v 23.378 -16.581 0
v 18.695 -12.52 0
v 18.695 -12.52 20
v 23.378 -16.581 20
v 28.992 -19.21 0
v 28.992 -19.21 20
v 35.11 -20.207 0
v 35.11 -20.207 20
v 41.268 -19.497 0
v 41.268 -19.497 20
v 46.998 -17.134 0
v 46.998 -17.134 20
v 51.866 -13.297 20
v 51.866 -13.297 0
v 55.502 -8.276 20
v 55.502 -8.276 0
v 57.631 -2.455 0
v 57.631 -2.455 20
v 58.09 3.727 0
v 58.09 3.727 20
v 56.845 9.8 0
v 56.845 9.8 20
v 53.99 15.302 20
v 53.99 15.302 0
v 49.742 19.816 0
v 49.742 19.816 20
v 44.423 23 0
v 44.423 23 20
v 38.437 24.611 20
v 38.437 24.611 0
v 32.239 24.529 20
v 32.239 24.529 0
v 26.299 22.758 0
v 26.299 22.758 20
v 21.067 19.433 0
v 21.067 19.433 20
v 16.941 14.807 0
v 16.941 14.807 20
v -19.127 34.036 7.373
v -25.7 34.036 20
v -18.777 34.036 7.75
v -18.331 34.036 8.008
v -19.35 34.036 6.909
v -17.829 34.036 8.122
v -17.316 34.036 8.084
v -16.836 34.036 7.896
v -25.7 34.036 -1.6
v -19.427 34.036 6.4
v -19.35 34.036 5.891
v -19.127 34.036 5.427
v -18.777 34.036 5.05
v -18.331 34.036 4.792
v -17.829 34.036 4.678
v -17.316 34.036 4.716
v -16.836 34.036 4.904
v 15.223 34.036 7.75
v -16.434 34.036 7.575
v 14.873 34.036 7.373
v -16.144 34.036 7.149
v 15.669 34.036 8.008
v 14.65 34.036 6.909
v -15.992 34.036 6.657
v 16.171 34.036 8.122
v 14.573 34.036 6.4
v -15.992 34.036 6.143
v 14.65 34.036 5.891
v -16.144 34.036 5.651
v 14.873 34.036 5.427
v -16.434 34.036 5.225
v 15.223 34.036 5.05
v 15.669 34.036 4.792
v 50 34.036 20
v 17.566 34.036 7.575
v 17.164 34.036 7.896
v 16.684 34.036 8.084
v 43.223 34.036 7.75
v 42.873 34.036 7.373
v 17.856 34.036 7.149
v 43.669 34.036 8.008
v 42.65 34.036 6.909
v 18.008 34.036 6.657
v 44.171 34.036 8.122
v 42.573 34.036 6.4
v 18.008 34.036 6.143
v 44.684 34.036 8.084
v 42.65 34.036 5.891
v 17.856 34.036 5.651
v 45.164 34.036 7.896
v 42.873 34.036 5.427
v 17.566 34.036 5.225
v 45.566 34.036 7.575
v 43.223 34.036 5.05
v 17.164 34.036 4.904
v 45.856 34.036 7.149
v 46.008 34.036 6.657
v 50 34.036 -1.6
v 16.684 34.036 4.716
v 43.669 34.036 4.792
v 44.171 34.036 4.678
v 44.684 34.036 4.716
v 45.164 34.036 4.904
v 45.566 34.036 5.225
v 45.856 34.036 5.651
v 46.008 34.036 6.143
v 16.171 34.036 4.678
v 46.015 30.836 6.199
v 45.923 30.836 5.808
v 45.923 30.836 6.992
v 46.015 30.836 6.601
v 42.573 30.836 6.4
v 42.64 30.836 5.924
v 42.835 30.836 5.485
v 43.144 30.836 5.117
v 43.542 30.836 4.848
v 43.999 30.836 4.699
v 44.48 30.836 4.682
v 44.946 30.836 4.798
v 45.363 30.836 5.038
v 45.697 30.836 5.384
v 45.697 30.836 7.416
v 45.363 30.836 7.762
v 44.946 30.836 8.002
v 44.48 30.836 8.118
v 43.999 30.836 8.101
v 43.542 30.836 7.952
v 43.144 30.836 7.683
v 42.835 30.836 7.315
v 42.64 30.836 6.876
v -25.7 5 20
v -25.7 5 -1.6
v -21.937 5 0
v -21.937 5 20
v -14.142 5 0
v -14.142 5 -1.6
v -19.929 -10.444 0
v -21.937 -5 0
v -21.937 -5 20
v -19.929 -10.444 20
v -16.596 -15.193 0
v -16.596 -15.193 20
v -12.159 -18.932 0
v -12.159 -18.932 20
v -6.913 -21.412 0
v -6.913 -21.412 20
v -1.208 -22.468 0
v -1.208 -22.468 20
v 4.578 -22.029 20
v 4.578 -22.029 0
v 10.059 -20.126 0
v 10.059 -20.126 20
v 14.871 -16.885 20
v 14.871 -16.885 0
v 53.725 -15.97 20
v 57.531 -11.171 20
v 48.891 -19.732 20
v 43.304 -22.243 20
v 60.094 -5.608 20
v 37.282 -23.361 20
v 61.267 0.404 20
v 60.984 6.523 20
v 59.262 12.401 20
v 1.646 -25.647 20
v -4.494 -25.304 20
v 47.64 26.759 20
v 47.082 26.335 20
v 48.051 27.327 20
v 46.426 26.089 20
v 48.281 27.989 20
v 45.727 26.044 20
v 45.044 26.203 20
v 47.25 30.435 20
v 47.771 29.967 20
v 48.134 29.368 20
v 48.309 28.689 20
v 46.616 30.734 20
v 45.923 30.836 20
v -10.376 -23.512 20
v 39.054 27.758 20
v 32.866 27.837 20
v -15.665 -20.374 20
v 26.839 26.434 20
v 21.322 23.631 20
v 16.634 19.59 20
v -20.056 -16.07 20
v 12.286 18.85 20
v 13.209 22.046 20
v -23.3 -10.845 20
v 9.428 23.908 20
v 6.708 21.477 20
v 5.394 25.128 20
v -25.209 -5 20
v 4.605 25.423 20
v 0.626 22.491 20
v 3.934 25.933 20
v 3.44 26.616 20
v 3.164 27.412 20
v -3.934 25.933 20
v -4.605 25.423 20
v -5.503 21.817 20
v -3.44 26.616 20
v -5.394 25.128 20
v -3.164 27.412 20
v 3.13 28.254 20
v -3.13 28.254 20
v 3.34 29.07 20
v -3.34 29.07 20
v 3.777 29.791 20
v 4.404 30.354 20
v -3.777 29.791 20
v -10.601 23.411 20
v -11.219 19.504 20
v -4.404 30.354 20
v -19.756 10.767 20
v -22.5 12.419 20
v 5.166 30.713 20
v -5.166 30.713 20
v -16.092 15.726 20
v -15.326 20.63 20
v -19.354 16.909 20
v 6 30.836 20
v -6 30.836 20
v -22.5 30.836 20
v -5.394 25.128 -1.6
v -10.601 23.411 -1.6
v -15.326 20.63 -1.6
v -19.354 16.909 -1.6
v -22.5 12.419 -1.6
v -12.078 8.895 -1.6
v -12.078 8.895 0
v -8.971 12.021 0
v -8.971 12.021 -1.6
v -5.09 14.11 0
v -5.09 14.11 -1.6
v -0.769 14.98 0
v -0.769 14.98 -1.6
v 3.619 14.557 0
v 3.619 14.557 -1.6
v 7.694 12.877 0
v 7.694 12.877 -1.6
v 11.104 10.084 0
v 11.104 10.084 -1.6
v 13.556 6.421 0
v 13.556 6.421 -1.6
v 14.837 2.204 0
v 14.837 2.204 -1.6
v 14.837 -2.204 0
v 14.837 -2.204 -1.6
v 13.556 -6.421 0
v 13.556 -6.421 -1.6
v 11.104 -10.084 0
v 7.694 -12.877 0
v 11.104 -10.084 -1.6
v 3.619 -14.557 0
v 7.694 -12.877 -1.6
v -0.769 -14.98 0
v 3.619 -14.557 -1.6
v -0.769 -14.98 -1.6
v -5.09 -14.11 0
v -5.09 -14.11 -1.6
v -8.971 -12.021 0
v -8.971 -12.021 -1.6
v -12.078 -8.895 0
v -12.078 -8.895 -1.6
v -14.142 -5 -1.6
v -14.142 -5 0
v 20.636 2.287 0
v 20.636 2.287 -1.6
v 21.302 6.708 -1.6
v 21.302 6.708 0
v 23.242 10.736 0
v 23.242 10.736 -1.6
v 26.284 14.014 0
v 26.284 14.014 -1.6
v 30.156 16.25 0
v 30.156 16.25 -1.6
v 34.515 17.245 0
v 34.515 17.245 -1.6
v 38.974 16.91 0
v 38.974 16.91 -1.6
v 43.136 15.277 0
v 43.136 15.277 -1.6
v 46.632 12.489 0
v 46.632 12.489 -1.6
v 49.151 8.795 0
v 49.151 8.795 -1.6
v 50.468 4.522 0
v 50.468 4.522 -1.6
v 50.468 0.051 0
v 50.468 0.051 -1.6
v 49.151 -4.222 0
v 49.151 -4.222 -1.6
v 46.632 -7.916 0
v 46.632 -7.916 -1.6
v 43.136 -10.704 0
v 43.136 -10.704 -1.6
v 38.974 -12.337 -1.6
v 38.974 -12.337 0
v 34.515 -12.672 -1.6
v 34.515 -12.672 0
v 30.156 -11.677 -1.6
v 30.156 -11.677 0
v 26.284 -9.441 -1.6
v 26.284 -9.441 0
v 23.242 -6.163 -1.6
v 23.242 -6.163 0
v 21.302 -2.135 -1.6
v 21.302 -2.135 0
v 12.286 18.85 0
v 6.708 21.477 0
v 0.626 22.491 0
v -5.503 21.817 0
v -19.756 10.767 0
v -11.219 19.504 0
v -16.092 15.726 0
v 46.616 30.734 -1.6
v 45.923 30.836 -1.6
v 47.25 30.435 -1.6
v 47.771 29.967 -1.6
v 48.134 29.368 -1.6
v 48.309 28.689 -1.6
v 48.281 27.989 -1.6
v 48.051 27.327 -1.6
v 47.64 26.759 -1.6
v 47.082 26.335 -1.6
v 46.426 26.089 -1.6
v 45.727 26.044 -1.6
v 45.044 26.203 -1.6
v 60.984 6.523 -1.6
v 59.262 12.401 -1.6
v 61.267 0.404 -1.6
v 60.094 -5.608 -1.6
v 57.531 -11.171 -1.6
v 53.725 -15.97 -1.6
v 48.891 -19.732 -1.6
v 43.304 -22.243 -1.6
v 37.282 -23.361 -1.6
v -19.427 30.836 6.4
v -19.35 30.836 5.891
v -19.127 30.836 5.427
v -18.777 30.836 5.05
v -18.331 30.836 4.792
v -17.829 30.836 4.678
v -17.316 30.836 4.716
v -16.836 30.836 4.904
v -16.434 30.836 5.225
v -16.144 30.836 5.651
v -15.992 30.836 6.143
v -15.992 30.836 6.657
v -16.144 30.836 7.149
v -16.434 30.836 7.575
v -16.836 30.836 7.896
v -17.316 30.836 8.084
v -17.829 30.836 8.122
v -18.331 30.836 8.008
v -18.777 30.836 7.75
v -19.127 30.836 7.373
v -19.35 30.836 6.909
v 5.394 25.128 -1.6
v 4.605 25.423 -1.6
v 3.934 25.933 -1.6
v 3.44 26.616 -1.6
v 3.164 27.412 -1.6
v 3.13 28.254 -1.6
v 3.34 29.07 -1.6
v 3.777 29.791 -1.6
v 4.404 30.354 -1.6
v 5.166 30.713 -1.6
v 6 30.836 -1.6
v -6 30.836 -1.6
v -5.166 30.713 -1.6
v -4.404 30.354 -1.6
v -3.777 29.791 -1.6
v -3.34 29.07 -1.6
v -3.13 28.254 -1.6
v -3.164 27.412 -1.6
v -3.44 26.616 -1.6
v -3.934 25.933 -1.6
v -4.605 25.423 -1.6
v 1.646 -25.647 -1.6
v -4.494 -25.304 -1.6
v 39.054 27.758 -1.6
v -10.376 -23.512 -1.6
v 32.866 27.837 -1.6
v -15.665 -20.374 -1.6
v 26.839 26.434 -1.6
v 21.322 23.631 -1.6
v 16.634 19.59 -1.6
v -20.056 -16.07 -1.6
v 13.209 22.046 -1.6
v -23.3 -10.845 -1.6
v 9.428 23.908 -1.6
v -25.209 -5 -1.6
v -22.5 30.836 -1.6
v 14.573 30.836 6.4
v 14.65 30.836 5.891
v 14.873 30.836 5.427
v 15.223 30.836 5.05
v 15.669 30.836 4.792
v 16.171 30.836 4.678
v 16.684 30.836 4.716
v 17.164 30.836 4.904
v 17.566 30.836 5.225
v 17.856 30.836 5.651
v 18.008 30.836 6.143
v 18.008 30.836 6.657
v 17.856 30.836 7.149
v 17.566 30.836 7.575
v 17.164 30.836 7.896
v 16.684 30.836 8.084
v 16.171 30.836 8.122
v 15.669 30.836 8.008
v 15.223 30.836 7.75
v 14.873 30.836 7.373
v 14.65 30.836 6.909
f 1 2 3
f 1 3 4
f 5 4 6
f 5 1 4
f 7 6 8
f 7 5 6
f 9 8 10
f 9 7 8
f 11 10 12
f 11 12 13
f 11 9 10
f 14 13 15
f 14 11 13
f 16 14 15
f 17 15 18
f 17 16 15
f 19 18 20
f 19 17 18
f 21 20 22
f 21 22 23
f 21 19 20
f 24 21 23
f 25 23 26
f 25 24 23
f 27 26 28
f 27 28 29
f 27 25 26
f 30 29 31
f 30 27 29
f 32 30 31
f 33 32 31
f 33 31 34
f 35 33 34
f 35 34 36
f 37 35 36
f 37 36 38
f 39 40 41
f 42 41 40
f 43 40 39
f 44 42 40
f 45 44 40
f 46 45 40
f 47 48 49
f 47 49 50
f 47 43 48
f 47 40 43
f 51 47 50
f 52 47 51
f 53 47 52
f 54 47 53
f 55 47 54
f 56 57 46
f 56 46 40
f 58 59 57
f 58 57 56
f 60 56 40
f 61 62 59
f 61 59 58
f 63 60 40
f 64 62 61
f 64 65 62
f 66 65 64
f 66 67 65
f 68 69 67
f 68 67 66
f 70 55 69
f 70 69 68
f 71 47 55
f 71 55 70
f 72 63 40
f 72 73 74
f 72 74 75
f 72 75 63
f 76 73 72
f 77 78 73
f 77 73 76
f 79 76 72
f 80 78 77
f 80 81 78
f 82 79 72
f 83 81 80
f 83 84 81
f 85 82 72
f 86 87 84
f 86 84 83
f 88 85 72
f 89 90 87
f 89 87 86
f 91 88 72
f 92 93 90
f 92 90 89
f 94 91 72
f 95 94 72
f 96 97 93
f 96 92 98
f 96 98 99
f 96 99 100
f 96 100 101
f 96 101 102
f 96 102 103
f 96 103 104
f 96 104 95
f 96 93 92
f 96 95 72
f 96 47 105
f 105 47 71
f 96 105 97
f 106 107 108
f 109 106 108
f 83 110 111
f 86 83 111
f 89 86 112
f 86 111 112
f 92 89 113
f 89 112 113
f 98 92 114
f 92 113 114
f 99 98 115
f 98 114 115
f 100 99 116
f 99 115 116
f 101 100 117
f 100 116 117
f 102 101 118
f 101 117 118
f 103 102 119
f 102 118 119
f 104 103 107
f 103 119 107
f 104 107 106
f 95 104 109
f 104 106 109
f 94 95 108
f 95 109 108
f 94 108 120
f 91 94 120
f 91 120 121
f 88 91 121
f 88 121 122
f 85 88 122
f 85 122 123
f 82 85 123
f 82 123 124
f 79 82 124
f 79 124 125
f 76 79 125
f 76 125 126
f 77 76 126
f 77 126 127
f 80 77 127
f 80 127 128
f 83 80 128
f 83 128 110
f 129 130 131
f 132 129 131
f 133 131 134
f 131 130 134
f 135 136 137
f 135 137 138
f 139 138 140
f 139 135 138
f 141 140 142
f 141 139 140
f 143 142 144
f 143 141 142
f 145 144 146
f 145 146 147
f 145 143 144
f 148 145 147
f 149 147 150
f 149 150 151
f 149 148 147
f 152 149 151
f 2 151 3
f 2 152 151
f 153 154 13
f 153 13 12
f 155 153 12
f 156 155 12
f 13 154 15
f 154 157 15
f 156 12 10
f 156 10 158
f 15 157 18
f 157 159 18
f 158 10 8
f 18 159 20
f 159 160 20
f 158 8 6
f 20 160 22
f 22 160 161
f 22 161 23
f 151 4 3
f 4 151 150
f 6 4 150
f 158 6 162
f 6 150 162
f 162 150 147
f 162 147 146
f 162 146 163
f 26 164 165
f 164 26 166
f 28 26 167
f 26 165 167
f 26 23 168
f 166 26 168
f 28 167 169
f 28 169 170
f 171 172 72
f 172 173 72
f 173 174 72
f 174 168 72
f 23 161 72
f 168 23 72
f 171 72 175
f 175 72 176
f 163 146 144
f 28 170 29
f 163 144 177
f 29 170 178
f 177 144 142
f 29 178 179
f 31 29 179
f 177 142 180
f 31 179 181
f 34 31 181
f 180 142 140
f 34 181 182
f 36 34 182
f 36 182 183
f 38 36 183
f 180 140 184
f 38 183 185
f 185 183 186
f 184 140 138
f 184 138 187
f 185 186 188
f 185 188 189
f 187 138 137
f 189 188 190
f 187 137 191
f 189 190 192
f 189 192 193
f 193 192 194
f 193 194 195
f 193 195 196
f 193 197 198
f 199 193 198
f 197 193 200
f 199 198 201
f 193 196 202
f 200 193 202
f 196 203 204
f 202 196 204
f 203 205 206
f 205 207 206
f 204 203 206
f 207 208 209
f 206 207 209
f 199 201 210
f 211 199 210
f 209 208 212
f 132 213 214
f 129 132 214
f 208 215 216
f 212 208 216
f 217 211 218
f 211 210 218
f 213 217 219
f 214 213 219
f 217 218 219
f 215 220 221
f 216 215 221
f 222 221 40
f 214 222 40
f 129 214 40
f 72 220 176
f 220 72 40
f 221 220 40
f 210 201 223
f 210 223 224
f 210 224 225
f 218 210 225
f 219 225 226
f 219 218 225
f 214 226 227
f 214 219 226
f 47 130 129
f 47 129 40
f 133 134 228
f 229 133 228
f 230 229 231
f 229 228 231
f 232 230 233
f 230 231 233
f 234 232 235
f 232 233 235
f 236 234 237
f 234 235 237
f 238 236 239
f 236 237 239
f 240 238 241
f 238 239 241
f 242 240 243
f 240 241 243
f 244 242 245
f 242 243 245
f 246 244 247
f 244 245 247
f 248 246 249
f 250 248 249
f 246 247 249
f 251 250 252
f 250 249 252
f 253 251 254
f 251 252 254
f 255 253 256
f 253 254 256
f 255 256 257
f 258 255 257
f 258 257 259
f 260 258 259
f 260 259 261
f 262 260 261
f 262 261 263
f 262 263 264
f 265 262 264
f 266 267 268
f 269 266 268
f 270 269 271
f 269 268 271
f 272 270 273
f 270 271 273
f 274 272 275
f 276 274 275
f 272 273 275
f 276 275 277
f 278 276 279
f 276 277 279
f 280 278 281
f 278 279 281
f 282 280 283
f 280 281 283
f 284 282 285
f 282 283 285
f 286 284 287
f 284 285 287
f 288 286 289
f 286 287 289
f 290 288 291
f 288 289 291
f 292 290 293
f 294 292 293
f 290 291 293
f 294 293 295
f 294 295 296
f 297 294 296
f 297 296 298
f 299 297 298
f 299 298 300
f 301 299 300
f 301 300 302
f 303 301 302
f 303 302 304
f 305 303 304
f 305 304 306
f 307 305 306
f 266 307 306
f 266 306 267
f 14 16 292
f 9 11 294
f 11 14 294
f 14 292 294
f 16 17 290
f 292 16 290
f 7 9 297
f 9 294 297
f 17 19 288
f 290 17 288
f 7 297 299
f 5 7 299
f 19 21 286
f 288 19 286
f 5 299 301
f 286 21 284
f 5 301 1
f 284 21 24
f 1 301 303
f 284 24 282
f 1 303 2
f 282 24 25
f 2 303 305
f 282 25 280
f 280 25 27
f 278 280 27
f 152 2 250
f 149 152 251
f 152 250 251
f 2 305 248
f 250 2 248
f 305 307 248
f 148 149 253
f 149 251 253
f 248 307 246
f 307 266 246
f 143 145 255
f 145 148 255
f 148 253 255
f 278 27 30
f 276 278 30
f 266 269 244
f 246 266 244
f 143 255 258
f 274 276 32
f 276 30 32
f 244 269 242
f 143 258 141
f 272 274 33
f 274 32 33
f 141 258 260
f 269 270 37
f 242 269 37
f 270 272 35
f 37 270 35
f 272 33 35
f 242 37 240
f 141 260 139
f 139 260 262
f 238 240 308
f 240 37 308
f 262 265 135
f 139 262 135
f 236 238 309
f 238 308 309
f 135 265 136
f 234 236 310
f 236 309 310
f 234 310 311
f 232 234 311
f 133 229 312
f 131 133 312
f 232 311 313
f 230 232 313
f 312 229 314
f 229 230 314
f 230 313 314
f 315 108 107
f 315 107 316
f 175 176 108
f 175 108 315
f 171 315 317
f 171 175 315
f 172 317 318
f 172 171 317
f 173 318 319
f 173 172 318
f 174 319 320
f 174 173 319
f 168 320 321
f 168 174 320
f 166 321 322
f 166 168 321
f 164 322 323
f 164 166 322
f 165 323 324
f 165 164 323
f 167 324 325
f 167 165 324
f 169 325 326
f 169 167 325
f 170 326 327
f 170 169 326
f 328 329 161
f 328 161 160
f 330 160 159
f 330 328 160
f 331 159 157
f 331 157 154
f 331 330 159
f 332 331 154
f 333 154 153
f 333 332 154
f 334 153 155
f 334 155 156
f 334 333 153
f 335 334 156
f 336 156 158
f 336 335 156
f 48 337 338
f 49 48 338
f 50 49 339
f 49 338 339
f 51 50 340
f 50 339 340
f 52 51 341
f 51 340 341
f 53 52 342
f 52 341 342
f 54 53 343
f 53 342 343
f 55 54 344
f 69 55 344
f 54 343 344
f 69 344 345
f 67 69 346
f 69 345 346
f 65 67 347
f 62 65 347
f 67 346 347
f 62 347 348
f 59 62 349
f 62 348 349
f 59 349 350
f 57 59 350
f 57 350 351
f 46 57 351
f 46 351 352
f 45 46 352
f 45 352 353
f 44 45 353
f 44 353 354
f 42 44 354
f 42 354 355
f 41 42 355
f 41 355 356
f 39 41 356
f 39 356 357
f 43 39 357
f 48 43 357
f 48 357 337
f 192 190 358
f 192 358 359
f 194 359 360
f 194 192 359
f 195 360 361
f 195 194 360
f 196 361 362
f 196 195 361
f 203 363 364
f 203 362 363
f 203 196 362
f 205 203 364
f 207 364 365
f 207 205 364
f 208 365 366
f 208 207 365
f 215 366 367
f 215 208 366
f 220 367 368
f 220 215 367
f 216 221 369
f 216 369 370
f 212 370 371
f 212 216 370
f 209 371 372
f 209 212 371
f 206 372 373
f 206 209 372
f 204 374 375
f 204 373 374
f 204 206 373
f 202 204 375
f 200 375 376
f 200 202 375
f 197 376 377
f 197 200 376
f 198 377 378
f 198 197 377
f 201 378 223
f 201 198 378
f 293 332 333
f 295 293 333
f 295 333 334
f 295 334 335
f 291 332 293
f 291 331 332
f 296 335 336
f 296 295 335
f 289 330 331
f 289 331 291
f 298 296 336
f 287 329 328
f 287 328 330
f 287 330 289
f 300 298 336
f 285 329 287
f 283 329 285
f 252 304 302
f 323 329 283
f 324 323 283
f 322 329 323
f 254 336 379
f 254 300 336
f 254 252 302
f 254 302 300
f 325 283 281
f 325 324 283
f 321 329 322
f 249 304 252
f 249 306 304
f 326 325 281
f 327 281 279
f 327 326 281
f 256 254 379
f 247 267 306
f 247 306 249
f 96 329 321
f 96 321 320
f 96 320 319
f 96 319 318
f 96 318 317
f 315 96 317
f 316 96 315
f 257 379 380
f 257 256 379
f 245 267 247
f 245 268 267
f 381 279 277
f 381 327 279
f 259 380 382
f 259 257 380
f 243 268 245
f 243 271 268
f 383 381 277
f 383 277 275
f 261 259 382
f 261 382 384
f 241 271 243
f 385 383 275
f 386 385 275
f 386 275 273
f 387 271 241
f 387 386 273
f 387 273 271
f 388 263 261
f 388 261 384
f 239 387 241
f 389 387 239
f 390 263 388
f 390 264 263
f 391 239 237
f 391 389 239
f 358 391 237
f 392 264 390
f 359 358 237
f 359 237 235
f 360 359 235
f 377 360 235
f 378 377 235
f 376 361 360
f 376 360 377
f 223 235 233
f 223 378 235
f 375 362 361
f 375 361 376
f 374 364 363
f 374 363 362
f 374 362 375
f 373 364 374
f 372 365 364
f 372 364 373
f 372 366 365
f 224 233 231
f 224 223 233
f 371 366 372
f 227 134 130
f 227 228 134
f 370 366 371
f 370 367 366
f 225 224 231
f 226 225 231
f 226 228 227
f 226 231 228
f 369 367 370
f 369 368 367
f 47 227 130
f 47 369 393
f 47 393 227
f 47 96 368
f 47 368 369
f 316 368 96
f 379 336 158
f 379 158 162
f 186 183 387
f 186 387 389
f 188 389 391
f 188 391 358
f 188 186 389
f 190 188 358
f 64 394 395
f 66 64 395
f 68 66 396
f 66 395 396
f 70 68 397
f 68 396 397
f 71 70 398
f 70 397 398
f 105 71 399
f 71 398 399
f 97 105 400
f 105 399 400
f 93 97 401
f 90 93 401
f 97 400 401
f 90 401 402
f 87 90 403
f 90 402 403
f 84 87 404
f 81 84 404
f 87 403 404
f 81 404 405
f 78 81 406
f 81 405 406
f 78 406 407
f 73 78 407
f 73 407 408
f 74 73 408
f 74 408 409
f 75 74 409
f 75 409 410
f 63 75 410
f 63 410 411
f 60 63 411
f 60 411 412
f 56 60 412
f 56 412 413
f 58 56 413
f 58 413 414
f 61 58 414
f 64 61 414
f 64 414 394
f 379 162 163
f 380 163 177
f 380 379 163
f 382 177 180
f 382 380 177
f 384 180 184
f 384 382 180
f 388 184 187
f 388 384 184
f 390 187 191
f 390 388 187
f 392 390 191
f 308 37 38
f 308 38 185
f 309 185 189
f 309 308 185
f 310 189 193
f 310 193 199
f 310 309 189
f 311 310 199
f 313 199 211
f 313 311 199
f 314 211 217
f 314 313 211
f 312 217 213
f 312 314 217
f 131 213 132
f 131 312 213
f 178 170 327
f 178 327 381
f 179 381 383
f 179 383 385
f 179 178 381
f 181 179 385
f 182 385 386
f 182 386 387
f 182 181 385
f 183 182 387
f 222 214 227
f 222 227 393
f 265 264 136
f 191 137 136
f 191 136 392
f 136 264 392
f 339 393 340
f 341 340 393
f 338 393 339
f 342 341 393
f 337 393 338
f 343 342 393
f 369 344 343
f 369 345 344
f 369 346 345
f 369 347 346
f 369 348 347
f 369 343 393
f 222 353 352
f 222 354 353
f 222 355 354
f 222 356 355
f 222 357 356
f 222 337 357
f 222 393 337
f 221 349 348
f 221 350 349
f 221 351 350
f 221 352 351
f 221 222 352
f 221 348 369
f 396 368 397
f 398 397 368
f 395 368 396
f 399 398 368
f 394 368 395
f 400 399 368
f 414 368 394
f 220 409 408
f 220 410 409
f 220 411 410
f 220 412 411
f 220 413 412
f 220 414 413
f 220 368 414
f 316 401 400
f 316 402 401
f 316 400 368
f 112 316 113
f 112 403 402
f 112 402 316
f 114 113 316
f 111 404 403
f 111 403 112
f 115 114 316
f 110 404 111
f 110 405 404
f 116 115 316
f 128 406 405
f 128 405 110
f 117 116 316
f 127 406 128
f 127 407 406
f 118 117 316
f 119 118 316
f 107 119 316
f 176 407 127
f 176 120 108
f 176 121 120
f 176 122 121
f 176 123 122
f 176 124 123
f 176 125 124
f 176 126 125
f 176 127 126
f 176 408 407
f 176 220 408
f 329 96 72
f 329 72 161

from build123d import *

# Parameters (mm, degrees)
BOSS_EXTRUDE1_DEPTH       = 20
BOSS_EXTRUDE2_START       = 1.6
BOSS_EXTRUDE2_DEPTH       = 1.6
CUT_EXTRUDE1_REACH        = 75.397
CUT_EXTRUDE3_REACH        = 75.397
CUT_EXTRUDE4_REACH        = 75.397
SKETCH6_R                 = 15
F_8_32_TAPPED_HOLE1_D     = 3.4544
F_8_32_TAPPED_HOLE1_DEPTH = 3.2


with BuildPart() as part:
    # Sketch1 → Boss-Extrude1 (new body)
    with BuildSketch(Plane.XY):
        with BuildLine():
            Line((37.281598718, -23.36075752), (1.645598718, -25.647261157))
            ThreePointArc((1.645598718, -25.647261157), (-17.581213168, -18.745424602), (-25.7, 0))
            Line((-25.7, 0), (-25.7, 34.036))
            Line((-25.7, 34.036), (50, 34.036))
            Line((50, 34.036), (59.262043429, 12.400853436))
            ThreePointArc((59.262043429, 12.400853436), (57.530912166, -11.170941189), (37.281598718, -23.36075752))
        make_face()
        with BuildLine():
            ThreePointArc((16.941307547, 14.806826081), (-22.453827861, -1.440699267), (18.694692453, -12.520322444))
            ThreePointArc((18.694692453, -12.520322444), (58.089827861, 3.727202903), (16.941307547, 14.806826081))
        make_face(mode=Mode.SUBTRACT)
    extrude(amount=BOSS_EXTRUDE1_DEPTH)

    # Sketch2 → Boss-Extrude2 (add)
    with BuildSketch(Plane(origin=(0, 0, 0), x_dir=(-1, 0, 0), z_dir=(0, 0, -1)).offset(BOSS_EXTRUDE2_START)):
        with BuildLine():
            Line((25.7, 0), (25.7, 34.036))
            Line((25.7, 34.036), (-50, 34.036))
            Line((-50, 34.036), (-59.262043429, 12.400853436))
            ThreePointArc((-59.262043429, 12.400853436), (-57.530912166, -11.170941189), (-37.281598718, -23.36075752))
            Line((-37.281598718, -23.36075752), (-1.645598718, -25.647261157))
            ThreePointArc((-1.645598718, -25.647261157), (17.581213168, -18.745424602), (25.7, 0))
        make_face()
    extrude(amount=-BOSS_EXTRUDE2_DEPTH)

    # Sketch3 → Cut-Extrude1 (cut, up to next)
    with BuildSketch(Plane.XY.offset(20), mode=Mode.PRIVATE) as cut_extrude1_sk1:
        with BuildLine():
            ThreePointArc((-5.394176999, 25.127531803), (-15.326311164, 20.629934225), (-22.5, 12.419339757))
            Line((-22.5, 12.419339757), (-22.5, 30.836))
            Line((-22.5, 30.836), (-6, 30.836))
            ThreePointArc((-6, 30.836), (-3.129737352, 28.254231355), (-5.394176999, 25.127531803))
        make_face()
    cut_extrude1_tool1 = extrude(cut_extrude1_sk1.sketch, amount=-CUT_EXTRUDE1_REACH, mode=Mode.PRIVATE) & part.part
    # Sketch3 → Cut-Extrude1 (cut, up to next)
    with BuildSketch(Plane.XY.offset(20), mode=Mode.PRIVATE) as cut_extrude1_sk2:
        with BuildLine():
            ThreePointArc((16.634374037, 19.590497707), (11.35689006, 23.054523378), (5.394176999, 25.127531803))
            ThreePointArc((5.394176999, 25.127531803), (3.129737352, 28.254231355), (6, 30.836))
            Line((6, 30.836), (45.922585437, 30.836))
            ThreePointArc((45.922585437, 30.836), (48.2805699, 27.988887856), (45.044015862, 26.202591058))
            ThreePointArc((45.044015862, 26.202591058), (29.810256845, 27.317498757), (16.634374037, 19.590497707))
        make_face()
    cut_extrude1_tool2 = extrude(cut_extrude1_sk2.sketch, amount=-CUT_EXTRUDE1_REACH, mode=Mode.PRIVATE) & part.part
    add(cut_extrude1_tool1.solids().sort_by_distance((-15.04252, 25.299031, 20))[0], mode=Mode.SUBTRACT)
    add(cut_extrude1_tool2.solids().sort_by_distance((22.114051, 27.528579, 20))[0], mode=Mode.SUBTRACT)

    # Sketch5 → Cut-Extrude3 (cut, up to next)
    with BuildSketch(Plane(origin=(0, 0, -1.6), x_dir=(-1, 0, 0), z_dir=(0, 0, -1)), mode=Mode.PRIVATE) as cut_extrude3_sk1:
        with BuildLine():
            Line((25.7, 5), (0, 5))
            ThreePointArc((0, 5), (-5, 0), (0, -5))
            Line((0, -5), (25.20892699, -5))
            ThreePointArc((25.20892699, -5), (25.576937108, -2.512028697), (25.7, 0))
            Line((25.7, 0), (25.7, 5))
        make_face()
    cut_extrude3_tool1 = extrude(cut_extrude3_sk1.sketch, amount=-CUT_EXTRUDE3_REACH, mode=Mode.PRIVATE) & part.part
    add(cut_extrude3_tool1.solids().sort_by_distance((-10.824957, 0.010355, -1.6))[0], mode=Mode.SUBTRACT)

    # Sketch6 → Cut-Extrude4 (cut, up to next)
    with BuildSketch(Plane(origin=(0, 0, -1.6), x_dir=(-1, 0, 0), z_dir=(0, 0, -1)), mode=Mode.PRIVATE) as cut_extrude4_sk1:
        with Locations((-35.636, 2.286503637)):
            Circle(SKETCH6_R)
    cut_extrude4_tool1 = extrude(cut_extrude4_sk1.sketch, amount=-CUT_EXTRUDE4_REACH, mode=Mode.PRIVATE) & part.part
    # Sketch6 → Cut-Extrude4 (cut, up to next)
    with BuildSketch(Plane(origin=(0, 0, -1.6), x_dir=(-1, 0, 0), z_dir=(0, 0, -1)), mode=Mode.PRIVATE) as cut_extrude4_sk2:
        Circle(SKETCH6_R)
    cut_extrude4_tool2 = extrude(cut_extrude4_sk2.sketch, amount=-CUT_EXTRUDE4_REACH, mode=Mode.PRIVATE) & part.part
    add(cut_extrude4_tool1.solids().sort_by_distance((35.636, 2.286504, -1.6))[0], mode=Mode.SUBTRACT)
    add(cut_extrude4_tool2.solids().sort_by_distance((0, 0, -1.6))[0], mode=Mode.SUBTRACT)

    # #8-32 Tapped Hole1
    with Locations(Plane(origin=(0, 34.036, 0), x_dir=(1, 0, 0), z_dir=(0, 1, 0))):
        with Locations((16.3, -6.4), (-17.7, -6.4), (44.3, -6.4)):
            Hole(F_8_32_TAPPED_HOLE1_D / 2, depth=F_8_32_TAPPED_HOLE1_DEPTH)


solid = part.part
